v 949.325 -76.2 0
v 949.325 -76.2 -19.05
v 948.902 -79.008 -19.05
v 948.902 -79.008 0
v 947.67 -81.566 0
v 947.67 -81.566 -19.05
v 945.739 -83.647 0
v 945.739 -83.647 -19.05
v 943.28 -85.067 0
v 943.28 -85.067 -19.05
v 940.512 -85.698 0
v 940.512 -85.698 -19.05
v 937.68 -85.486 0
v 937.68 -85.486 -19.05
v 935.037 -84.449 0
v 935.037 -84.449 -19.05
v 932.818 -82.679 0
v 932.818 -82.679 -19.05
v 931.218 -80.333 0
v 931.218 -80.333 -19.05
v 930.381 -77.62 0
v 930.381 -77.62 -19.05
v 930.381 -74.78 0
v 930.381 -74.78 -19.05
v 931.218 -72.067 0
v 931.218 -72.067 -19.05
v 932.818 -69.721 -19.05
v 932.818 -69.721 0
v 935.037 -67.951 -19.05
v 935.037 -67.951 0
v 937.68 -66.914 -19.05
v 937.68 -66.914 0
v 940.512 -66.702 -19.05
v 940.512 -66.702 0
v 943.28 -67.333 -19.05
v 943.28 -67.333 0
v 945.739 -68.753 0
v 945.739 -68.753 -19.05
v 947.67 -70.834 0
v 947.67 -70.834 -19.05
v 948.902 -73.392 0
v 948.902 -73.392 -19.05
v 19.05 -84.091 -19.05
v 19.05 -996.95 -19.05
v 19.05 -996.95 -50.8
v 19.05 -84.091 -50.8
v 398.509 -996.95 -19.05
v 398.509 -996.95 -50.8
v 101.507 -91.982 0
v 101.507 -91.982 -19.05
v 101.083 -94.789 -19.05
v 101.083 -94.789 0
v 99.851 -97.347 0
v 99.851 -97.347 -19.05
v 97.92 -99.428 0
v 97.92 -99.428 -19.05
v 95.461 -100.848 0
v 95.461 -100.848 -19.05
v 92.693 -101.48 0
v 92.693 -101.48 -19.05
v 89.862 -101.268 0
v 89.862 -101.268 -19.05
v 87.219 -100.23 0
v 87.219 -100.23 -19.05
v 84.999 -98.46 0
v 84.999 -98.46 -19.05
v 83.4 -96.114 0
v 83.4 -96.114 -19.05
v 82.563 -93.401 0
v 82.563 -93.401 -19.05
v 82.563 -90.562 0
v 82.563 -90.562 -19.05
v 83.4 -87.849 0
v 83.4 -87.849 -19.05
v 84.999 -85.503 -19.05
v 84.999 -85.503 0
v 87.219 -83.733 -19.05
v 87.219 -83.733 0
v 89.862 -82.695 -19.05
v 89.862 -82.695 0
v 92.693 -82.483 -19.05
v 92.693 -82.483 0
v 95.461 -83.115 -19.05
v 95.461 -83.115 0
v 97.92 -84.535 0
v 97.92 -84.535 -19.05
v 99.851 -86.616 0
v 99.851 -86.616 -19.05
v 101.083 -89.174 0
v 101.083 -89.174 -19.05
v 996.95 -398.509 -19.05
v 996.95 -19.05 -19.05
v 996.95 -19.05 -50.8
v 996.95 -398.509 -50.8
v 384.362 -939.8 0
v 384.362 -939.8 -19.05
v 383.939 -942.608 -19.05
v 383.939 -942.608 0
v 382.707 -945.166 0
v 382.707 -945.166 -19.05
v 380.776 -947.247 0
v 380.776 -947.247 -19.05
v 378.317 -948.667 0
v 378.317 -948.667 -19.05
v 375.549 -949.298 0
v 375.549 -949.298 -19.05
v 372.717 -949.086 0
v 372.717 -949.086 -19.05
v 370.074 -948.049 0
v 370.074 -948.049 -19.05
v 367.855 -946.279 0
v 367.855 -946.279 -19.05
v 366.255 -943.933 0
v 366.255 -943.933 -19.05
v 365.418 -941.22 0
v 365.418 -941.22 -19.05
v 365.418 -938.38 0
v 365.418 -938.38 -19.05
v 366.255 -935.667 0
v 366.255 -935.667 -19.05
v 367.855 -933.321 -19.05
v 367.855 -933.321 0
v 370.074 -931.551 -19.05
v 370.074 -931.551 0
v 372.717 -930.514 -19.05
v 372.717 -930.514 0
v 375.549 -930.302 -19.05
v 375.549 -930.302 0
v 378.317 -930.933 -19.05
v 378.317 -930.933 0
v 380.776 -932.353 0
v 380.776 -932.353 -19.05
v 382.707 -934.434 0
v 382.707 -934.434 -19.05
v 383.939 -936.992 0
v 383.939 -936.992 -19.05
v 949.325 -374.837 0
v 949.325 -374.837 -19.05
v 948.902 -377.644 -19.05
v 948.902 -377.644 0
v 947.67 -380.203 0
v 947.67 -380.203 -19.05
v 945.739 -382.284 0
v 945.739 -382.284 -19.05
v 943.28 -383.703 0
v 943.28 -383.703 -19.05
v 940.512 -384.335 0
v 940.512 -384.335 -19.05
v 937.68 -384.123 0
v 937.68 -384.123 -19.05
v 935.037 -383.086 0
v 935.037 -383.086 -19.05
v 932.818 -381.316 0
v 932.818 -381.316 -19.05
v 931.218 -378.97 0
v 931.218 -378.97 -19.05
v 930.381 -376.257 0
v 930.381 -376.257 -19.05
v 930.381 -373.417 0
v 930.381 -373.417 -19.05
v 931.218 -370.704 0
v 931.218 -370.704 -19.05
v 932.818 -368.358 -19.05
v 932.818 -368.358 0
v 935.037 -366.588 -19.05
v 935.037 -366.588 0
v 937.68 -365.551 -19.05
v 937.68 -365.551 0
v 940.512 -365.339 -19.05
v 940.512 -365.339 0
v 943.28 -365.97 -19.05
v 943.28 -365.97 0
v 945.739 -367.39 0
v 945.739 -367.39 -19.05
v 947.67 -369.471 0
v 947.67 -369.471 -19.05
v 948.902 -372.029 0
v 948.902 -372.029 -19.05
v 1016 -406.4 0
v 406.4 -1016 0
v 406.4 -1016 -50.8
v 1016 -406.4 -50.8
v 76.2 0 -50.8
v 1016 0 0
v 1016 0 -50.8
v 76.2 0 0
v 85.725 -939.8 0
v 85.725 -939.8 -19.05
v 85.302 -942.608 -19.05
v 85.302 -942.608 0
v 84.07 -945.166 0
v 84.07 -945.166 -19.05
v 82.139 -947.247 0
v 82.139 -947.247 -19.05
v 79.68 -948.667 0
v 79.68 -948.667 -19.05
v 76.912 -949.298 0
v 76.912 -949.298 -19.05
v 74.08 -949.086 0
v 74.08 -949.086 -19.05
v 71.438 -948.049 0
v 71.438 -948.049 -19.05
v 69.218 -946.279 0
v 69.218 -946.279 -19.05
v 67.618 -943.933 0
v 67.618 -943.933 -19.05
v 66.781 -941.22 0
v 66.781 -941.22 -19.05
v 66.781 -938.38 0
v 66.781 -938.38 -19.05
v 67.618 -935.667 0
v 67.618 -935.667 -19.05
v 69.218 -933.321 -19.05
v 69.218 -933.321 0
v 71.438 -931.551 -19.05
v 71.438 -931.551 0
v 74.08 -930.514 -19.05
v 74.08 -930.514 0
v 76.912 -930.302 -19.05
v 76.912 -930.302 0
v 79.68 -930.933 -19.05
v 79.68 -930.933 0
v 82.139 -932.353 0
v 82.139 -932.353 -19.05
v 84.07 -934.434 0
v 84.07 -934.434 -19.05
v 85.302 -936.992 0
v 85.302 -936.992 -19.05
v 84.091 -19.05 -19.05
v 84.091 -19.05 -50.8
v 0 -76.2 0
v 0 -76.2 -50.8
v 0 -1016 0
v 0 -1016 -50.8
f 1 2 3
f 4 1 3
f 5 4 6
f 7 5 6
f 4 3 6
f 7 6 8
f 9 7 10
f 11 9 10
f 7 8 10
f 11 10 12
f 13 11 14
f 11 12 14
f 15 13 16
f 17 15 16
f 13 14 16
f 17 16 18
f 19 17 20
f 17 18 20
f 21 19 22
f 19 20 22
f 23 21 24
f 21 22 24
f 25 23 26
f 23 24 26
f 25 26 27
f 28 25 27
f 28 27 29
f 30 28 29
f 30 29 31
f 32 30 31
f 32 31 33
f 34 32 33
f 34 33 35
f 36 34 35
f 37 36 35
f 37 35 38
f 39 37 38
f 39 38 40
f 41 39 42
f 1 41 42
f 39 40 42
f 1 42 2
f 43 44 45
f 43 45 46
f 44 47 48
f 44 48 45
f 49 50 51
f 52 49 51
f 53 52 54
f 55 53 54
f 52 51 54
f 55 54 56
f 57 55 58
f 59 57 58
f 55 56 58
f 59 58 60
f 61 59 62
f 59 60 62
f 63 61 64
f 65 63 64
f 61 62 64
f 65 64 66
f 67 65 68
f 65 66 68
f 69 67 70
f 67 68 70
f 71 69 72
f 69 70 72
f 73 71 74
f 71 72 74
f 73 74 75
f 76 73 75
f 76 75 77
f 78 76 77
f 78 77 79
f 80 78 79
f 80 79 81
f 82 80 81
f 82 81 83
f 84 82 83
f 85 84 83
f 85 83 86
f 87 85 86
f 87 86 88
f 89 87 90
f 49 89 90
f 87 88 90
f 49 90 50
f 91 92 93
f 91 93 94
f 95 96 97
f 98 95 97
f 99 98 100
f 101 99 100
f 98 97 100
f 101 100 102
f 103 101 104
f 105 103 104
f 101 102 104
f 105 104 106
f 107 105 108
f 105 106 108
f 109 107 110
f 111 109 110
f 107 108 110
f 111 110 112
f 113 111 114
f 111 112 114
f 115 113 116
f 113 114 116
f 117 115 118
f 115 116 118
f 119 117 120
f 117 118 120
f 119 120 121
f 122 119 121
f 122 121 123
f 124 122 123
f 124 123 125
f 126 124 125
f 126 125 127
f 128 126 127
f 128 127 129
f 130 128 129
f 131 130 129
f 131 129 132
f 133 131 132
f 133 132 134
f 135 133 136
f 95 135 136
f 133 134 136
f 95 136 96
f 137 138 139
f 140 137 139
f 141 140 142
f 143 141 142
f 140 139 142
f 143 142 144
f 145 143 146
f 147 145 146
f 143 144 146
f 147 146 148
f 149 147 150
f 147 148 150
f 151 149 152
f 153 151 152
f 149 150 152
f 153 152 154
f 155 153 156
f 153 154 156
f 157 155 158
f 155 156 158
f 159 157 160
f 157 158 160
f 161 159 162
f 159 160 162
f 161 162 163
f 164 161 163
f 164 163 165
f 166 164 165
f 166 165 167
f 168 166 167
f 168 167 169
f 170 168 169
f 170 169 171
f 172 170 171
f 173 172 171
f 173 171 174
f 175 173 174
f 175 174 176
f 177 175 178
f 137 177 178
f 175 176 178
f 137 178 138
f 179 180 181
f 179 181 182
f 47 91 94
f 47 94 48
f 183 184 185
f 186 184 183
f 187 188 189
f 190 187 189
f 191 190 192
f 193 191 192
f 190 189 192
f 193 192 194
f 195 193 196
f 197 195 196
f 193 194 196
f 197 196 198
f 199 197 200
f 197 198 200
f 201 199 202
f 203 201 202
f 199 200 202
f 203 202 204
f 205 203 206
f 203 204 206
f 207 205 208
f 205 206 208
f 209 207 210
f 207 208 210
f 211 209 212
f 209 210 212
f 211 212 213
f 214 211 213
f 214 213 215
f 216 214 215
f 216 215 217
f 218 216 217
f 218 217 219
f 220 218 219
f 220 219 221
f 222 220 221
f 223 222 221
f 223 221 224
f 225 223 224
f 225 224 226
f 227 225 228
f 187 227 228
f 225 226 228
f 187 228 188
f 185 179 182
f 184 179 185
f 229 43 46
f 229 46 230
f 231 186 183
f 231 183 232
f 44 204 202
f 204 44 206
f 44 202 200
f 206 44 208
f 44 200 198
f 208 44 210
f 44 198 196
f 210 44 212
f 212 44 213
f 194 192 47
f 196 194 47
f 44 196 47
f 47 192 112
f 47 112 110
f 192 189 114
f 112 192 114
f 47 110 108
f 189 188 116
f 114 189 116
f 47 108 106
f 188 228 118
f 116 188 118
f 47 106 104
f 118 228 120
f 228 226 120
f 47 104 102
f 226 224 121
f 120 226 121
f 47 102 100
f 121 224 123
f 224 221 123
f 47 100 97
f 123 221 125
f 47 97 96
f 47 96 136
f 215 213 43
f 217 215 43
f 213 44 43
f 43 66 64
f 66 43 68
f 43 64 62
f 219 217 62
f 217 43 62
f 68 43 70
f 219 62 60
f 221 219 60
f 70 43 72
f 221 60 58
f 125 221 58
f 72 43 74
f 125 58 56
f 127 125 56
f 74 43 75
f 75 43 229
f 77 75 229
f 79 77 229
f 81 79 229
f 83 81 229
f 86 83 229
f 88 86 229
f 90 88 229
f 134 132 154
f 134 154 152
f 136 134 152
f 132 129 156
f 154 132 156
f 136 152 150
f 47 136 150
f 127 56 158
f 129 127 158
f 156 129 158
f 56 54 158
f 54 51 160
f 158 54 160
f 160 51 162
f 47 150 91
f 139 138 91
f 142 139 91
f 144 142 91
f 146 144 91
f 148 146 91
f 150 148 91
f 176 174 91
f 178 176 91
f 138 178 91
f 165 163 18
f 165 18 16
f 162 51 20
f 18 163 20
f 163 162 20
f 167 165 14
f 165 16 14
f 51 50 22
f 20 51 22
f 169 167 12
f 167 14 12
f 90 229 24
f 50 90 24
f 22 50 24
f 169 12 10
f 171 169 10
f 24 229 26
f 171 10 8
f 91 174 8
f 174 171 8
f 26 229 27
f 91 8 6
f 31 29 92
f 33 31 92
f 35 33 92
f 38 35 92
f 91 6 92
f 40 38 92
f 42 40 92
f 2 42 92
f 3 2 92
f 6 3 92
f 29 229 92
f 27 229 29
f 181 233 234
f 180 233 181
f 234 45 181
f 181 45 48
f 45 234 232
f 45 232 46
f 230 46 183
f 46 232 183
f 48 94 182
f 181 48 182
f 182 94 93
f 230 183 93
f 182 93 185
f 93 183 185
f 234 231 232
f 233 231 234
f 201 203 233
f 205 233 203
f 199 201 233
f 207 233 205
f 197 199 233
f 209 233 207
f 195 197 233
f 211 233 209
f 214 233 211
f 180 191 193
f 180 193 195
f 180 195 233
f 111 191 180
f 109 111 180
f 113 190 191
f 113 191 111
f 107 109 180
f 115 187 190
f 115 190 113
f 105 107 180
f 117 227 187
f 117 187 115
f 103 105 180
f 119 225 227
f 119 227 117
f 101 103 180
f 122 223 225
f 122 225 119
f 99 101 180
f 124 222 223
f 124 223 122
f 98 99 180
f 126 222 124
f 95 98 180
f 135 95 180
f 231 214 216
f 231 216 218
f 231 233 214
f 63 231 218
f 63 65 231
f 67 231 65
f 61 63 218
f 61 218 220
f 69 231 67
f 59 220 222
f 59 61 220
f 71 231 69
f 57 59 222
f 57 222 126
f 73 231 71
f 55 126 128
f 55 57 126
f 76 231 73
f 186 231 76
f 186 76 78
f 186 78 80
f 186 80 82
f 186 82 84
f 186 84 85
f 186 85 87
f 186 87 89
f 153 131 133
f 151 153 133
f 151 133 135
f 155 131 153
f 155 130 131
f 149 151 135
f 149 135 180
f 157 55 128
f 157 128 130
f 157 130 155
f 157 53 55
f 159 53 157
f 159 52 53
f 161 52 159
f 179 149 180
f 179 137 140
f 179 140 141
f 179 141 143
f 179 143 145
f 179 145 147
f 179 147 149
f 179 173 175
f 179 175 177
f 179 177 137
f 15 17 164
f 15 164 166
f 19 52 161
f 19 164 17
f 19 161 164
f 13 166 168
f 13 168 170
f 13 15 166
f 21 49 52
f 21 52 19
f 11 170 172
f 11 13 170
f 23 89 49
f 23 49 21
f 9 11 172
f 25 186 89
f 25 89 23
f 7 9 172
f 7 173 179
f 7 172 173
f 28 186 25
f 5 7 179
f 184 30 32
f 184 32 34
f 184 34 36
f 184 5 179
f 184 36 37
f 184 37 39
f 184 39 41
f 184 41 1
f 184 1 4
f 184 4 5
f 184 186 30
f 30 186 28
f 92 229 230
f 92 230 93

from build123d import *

# Parameters (mm, degrees)
F1_DEPTH = 50.8
F2_DEPTH = 19.05
F3_R     = 9.525
F4_DEPTH = 19.05


with BuildPart() as f1:
    # F0 (on Top) → F1 (new body)
    with BuildSketch(Plane.XY):
        Polygon((0, -76.2), (0, -1016), (406.4, -1016), (1016, -406.4), (1016, 0), (76.2, 0), align=None)
        Polygon((398.509232, -996.95), (19.05, -996.95), (19.05, -84.090768), (84.090768, -19.05), (996.95, -19.05), (996.95, -398.509232), align=None, mode=Mode.SUBTRACT)
    extrude(amount=-F1_DEPTH)

    # F0 (on Top) → F2 (join)
    with BuildSketch(Plane.XY):
        Polygon((19.05, -84.090768), (19.05, -996.95), (398.509232, -996.95), (996.95, -398.509232), (996.95, -19.05), (84.090768, -19.05), align=None)
    extrude(amount=-F2_DEPTH)

    # F3 (on face) → F4 (cut, through all)
    with BuildSketch(Plane(origin=(0, 0, -19.05), x_dir=(1, 0, 0), z_dir=(0, 0, -1))):
        with Locations((76.2, 939.8)):
            Circle(F3_R)
        with Locations((91.981537, 91.981537)):
            Circle(F3_R)
        with Locations((374.836927, 939.8)):
            Circle(F3_R)
        with Locations((939.8, 374.836927)):
            Circle(F3_R)
        with Locations((939.8, 76.2)):
            Circle(F3_R)
    extrude(amount=-F4_DEPTH, mode=Mode.SUBTRACT)


solid = f1.part
